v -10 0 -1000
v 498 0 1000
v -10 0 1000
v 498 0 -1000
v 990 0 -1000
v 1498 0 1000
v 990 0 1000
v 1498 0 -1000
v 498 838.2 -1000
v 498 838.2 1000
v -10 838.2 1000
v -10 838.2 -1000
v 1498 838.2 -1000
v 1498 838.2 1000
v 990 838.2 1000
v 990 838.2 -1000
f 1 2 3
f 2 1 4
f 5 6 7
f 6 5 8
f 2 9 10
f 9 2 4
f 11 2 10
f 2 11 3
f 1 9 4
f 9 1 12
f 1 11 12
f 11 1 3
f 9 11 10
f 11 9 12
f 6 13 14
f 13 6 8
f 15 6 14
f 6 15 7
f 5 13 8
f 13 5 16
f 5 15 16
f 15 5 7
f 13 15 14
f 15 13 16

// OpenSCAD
UnitArray=[19*2.54*10,32*2.54*10,1.75*2.54*10];
/*
* This array represents x,y,z locations that the crane
* moves to.  Note that the array is doubly indexed.  So that creates
* an array of vectors. Which are themselves an array of three
*/
loc0 = [
    [0,0,0],
    [0,300,0],
    [0,600,0],
    [0,1000,0],
    [0,1000,300],
    [0,1000,600],
    [0,1000,1000],
    [300,1000,1000],
    [600,1000,1000],
    [1000,1000,1000],
    [1000,1000,600],
    [1000,1000,300],
    [1000,1000,0],
    [1000,600,0],
    [1000,300,0],
    [1000,0,0],
    [1000,000,0],
    [1000,000,0],
    [1000,000,0],
    [1000,000,0]
      ];
 loc1 = [
    [1000,0,000],
    [1000,300,200],
    [1000,600,200],
    [1000,1000,200],
    [1000,1000,200],
    [1000,1000,500],
    [1000,1000,700],
    [1000,1000,900],
    [1000,1000,1100],
    [600,1000,1100],
    [300,1000,1100],
    [0,1000,1100],
    [0,1000,700],
    [0,1000,300],
    [0,1000,0],
    [0,600,0],
    [0,300,0],
    [0,0,0],
    [0,0,0],
    [0,0,0]
  
      ];


/*
* This is the secret sauce.  The lookup function does interpolations
* between entries.  A lookup table has a series of keys and values.
* The keys must be monotonic. That is they all increase in value from
* one to the next or they all decrease in value.  Then when a key is
* passed that is in between two key values.  The lookup function
* interpolates between the two.
*
* The key values are given values from 0 to 1 by dividing by the 
* len of the array of vectors.  This makes the keys represent
* possible values of $t.  The values are points in the loc array.
*
* The lookup table can have variables as values.  So we effectively
* have three lookup tables. See below for example with constants.
*
* 
*/
function xyz0(t,i) = 
    lookup(t, [
    [0/len(loc0),loc0[0][i]],
    [1/len(loc0),loc0[1][i]],
    [2/len(loc0),loc0[2][i]],
    [3/len(loc0),loc0[3][i]],
    [4/len(loc0),loc0[4][i]],
    [5/len(loc0),loc0[5][i]],
    [6/len(loc0),loc0[6][i]],
    [7/len(loc0),loc0[7][i]],
    [8/len(loc0),loc0[8][i]],
    [9/len(loc0),loc0[9][i]],
    [10/len(loc0),loc0[10][i]],
    [11/len(loc0),loc0[11][i]],
    [12/len(loc0),loc0[12][i]],
    [13/len(loc0),loc0[13][i]],
    [14/len(loc0),loc0[14][i]],
    [15/len(loc0),loc0[15][i]],
    [16/len(loc0),loc0[16][i]],
    [17/len(loc0),loc0[17][i]],
    [18/len(loc0),loc0[18][i]],
    [19/len(loc0),loc0[19][i]],
    [20/len(loc0),loc0[20][i]],
]);
function xyz1(t,i) = 
    lookup(t, [
    [0/len(loc1),loc1[0][i]],
    [1/len(loc1),loc1[1][i]],
    [2/len(loc1),loc1[2][i]],
    [3/len(loc1),loc1[3][i]],
    [4/len(loc1),loc1[4][i]],
    [5/len(loc1),loc1[5][i]],
    [6/len(loc1),loc1[6][i]],
    [7/len(loc1),loc1[7][i]],
    [8/len(loc1),loc1[8][i]],
    [9/len(loc1),loc1[9][i]],
    [10/len(loc1),loc1[10][i]],
    [11/len(loc1),loc1[11][i]],
    [12/len(loc1),loc1[12][i]],
    [13/len(loc1),loc1[13][i]],
    [14/len(loc1),loc1[14][i]],
    [15/len(loc1),loc1[15][i]],
    [16/len(loc1),loc1[16][i]],
    [17/len(loc1),loc1[17][i]],
    [18/len(loc1),loc1[18][i]],
    [19/len(loc1),loc1[19][i]],
    [20/len(loc1),loc1[20][i]],
]);

/*
* I am showing these as an example of one variable in the lookup
* table.  This approach is fine if one has one variable or several
* unrelated variables.  Because x,y, and z represent points that the
* effector is being moved to, the array approach is easier to make
* changes to the path.
*/
/*
function X(t) = 
    lookup(t, [
    [0/len(loc),0],
    [1/len(loc),50],
    [2/len(loc),-50],
    [3/len(loc),-50],
    [4/len(loc),40],
    [5/len(loc),40],
    [6/len(loc),50],
    [7/len(loc),0],

]);function Y(t) = 
    lookup(t, [
    [0/len(loc),0],
    [1/len(loc),50],
    [2/len(loc),50],
    [3/len(loc),-50],
    [4/len(loc),-40],
    [5/len(loc),40],
    [6/len(loc),0],
    [7/len(loc),0],

]);function Z(t) = 
    lookup(t, [
    [0/len(loc),10],
    [1/len(loc),10],
    [2/len(loc),50],
    [3/len(loc),10],
    [4/len(loc),30],
    [5/len(loc),10],
    [6/len(loc),40],
    [7/len(loc),10],

]);
*/

//Call the main module with variables that depend on $t
Unit(xyz0($t,0),xyz0($t,1),xyz0($t,2),[1-1*$t,$t,0]);
Unit(xyz1($t,0),xyz1($t,1),xyz1($t,2),[$t,1-1*$t,0]);
translate([-10,0,-1000]) color([0,1,0],0.2) cube([20*2.54*10,33*2.54*10,2000]);
translate([990,0,-1000]) color([1,0,0],0.2) cube([20*2.54*10,33*2.54*10,2000]);

module Unit(x,y,z,c)
{
    color(c)
    translate([x,y,z])
    cube(UnitArray);
}

//the LAST two lines are the commands to make the STL and the png. last line makes PNG and second last line makes STL
//converting dumped images from animation to mpeg:
//convert -quality 100 frame*.png outputfile.mpeg
//to get the last line do: (exec $(tail -n1 filename))
//to get the second last line do: (exec $(tail -n2 filename|head -n1))

//Applications/OpenSCAD.app/Contents/MacOS/OpenSCAD --render -o Figure-source-NDC-racktetrisanimation.stl Figure-source-NDC-racktetrisanimation.scad
//Applications/OpenSCAD.app/Contents/MacOS/OpenSCAD -o Figure-source-NDC-racktetrisanimation.png --colorscheme=Tomorrow --imgsize=1220,1080 --camera=988,464,55,68,0,206,8172 Figure-source-NDC-racktetrisanimation.scad
